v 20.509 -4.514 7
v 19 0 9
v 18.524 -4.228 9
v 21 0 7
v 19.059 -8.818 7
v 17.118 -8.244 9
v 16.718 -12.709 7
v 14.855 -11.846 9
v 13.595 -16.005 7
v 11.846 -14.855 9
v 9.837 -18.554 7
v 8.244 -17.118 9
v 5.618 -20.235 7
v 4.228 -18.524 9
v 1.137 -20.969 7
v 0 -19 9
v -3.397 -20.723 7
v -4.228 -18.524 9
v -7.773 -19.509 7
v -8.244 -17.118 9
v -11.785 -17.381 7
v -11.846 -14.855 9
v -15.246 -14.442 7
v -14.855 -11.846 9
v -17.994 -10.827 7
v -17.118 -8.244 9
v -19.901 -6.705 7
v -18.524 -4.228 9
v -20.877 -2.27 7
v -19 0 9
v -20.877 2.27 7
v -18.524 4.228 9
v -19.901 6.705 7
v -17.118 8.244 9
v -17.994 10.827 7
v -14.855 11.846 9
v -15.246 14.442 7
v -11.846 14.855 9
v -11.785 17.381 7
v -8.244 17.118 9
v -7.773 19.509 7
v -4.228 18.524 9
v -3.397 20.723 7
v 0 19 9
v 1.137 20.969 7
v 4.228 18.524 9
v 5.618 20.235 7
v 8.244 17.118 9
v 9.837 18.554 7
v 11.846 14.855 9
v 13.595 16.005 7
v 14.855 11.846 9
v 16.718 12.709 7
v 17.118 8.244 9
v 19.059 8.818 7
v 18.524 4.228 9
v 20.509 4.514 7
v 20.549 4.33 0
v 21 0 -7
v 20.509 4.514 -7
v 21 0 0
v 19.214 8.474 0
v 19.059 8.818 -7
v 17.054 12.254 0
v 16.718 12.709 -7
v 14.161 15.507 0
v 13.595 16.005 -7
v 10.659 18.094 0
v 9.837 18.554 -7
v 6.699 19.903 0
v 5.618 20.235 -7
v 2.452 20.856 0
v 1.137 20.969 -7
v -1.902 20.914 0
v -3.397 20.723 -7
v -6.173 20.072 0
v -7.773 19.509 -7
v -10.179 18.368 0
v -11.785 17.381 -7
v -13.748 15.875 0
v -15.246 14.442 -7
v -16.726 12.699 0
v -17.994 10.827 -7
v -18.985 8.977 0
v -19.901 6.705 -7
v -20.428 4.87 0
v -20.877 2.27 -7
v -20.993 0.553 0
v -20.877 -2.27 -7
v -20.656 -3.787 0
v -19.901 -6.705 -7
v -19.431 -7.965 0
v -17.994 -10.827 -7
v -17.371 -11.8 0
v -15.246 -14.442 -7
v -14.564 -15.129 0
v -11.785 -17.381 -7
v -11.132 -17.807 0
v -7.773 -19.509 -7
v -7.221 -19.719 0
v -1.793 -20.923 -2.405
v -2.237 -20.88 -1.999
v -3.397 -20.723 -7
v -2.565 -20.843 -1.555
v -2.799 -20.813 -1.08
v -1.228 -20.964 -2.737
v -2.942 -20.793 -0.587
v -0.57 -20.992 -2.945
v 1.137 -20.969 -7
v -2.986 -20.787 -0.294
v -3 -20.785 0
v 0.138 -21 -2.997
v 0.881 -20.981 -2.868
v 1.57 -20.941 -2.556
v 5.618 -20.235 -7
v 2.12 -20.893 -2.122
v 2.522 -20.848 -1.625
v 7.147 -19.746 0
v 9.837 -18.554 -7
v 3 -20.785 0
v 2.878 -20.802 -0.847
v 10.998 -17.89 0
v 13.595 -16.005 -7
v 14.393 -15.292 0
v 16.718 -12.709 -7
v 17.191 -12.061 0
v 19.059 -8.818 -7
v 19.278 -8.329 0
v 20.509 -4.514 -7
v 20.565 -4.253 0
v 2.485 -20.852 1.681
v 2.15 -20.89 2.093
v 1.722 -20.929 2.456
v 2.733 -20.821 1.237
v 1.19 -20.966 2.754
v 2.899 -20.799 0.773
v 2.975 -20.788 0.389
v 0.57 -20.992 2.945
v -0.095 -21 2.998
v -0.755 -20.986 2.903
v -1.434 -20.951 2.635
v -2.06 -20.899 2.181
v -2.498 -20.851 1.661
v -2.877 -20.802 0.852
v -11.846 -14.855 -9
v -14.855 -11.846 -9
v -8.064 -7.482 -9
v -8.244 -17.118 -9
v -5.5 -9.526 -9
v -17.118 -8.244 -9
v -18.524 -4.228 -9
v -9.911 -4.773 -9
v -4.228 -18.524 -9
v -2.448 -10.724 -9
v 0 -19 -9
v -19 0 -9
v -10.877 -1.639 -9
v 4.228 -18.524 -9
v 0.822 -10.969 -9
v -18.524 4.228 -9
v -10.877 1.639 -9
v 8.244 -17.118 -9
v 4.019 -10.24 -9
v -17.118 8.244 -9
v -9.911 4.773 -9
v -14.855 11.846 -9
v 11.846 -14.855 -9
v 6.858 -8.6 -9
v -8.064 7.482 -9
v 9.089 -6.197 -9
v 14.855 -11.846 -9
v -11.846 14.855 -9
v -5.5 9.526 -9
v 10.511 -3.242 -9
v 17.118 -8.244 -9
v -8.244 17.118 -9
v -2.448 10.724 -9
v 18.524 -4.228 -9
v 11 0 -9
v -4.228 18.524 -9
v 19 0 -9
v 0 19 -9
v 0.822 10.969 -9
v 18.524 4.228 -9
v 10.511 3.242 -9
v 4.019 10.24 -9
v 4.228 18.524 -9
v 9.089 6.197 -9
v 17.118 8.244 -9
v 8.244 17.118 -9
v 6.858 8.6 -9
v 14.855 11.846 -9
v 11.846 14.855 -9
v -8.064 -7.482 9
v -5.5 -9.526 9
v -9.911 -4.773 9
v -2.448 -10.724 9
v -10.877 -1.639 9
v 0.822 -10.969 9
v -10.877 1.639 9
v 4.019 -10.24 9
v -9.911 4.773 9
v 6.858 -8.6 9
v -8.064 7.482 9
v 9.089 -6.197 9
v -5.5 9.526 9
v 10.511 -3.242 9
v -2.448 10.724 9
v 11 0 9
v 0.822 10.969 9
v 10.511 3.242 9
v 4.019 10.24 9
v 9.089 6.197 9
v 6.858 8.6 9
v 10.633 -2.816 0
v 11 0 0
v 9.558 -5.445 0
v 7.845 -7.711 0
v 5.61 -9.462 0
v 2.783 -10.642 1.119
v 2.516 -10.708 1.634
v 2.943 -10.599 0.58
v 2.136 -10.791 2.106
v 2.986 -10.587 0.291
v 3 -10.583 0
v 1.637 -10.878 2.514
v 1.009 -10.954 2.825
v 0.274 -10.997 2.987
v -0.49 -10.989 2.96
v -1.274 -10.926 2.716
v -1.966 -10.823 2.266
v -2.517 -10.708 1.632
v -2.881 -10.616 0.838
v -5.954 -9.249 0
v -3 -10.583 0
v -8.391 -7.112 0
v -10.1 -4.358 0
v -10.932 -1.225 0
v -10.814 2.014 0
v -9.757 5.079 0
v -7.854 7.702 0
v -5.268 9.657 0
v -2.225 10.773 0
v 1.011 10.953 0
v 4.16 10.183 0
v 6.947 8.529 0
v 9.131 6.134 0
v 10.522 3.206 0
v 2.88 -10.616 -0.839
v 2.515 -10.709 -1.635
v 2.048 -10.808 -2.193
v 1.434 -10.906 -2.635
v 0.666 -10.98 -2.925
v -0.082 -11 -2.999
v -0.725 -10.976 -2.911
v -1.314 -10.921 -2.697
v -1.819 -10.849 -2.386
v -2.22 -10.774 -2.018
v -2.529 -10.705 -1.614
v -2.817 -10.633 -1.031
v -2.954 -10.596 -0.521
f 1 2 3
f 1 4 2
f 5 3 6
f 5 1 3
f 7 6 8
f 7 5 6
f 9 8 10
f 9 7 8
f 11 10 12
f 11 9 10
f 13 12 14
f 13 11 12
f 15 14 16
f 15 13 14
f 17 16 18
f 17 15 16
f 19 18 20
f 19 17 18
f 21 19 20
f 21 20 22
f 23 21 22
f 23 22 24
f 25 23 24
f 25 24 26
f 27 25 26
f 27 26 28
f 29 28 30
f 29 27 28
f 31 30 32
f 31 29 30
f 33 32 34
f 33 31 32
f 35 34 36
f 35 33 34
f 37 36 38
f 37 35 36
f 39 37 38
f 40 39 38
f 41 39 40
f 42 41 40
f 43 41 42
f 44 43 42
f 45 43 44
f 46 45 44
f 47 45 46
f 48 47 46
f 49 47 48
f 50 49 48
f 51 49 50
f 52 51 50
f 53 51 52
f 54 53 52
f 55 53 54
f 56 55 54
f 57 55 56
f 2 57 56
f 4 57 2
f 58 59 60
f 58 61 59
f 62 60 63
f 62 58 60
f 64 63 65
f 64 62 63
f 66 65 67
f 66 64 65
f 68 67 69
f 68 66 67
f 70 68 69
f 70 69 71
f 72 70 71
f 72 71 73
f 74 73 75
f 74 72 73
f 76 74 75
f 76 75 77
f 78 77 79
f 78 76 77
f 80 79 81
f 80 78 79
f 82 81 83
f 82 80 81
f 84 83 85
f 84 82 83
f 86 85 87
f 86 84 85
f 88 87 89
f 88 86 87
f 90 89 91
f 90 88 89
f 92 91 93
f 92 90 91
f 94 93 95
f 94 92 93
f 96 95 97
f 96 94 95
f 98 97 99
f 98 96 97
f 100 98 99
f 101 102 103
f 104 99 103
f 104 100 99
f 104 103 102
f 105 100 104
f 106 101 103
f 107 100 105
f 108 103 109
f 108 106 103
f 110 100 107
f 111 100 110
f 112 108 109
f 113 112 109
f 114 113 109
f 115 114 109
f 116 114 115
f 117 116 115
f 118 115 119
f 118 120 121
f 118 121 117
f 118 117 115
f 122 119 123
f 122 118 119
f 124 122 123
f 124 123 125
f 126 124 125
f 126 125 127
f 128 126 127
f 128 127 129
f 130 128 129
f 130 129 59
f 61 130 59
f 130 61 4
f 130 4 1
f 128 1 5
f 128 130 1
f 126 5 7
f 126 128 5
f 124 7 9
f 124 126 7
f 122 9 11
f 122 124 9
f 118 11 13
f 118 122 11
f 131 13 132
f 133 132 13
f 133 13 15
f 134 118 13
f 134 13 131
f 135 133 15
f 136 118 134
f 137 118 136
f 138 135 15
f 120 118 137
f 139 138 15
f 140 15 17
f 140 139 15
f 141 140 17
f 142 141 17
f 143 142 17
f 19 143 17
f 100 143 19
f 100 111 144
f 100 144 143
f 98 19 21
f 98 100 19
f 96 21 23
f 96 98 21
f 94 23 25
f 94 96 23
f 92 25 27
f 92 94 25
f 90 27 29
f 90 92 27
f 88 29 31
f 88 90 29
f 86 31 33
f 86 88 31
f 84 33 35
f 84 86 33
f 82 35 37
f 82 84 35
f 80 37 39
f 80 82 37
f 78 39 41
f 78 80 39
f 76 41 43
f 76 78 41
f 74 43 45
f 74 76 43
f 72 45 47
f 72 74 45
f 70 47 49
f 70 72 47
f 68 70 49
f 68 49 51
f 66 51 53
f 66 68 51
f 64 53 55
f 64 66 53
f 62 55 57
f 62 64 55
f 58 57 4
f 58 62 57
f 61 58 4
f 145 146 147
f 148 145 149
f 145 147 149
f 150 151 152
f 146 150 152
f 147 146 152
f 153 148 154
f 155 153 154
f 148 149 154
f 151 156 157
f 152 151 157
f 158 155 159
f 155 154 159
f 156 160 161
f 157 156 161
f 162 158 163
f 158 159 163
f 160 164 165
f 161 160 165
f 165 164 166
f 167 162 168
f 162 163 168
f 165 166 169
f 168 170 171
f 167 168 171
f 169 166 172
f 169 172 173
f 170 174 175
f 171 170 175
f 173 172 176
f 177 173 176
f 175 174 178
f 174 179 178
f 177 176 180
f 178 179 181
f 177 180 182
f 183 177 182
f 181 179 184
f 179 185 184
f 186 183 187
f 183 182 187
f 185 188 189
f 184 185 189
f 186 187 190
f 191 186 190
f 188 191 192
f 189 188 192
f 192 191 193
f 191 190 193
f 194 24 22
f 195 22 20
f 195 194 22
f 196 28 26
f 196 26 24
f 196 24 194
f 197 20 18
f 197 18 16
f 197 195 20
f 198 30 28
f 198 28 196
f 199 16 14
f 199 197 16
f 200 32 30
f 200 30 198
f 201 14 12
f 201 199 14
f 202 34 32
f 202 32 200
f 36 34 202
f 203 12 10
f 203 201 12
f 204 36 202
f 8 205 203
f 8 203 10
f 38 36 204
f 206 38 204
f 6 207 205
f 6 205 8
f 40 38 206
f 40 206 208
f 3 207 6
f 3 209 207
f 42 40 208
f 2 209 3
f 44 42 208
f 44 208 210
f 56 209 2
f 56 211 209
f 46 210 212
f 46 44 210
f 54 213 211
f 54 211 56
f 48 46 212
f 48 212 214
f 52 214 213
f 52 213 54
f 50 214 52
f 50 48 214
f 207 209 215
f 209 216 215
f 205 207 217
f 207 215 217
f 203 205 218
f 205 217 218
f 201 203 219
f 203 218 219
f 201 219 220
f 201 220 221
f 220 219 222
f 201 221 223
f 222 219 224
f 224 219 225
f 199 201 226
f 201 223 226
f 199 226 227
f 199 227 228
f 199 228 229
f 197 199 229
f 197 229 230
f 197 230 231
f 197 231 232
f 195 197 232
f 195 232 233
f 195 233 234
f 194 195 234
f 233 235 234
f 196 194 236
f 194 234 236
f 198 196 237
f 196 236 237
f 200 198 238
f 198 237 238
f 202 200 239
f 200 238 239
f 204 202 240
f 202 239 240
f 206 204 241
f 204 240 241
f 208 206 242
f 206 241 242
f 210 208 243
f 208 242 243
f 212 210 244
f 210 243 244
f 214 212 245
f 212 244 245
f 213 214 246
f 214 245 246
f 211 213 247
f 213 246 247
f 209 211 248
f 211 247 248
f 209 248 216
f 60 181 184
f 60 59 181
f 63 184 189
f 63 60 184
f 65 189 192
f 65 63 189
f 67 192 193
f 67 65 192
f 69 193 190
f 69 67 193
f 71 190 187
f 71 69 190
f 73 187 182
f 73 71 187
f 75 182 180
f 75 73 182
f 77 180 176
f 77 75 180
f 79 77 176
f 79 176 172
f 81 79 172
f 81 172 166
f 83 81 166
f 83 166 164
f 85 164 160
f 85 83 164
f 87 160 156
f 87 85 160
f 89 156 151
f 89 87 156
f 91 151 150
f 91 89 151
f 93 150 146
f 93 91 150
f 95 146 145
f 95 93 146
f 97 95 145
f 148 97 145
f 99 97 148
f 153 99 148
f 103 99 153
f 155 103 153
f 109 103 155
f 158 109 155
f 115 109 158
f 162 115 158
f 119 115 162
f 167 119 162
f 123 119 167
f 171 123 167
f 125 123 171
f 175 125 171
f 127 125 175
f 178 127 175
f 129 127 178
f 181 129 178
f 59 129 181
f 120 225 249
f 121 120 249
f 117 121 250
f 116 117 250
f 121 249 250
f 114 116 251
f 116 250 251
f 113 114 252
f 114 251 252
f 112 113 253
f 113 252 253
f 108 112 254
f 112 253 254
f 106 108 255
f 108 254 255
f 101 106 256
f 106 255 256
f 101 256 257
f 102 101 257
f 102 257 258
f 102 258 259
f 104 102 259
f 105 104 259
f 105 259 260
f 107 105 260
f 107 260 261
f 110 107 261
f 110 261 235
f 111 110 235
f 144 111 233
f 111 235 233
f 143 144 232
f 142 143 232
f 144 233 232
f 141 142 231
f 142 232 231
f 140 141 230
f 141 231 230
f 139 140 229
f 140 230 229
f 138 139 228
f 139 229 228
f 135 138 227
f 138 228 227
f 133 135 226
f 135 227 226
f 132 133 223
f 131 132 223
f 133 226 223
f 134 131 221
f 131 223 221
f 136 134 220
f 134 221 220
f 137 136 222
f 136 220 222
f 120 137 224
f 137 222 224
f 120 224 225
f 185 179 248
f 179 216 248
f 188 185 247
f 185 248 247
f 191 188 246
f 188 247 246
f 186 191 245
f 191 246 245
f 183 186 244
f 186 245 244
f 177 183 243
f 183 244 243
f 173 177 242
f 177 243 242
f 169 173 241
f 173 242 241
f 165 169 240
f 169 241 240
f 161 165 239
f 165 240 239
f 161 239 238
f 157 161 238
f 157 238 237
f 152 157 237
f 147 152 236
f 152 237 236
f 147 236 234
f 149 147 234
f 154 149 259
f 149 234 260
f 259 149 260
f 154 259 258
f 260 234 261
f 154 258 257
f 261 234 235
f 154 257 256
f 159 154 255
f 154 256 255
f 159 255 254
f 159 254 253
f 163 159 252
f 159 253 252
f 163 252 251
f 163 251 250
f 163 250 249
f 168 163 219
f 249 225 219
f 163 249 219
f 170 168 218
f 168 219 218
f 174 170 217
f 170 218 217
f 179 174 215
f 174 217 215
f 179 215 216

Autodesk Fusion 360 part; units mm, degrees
sketch "Sketch1" plane through (0, 0, 0) normal (0, 0, 1) x (1, 0, 0)
  circle A0 centre (0, 0) radius 11
  circle A1 centre (0, 0) radius 21
  dimension "d1" = 22
  dimension "d2" = 42
extrude "Extrude1" add sketch "Sketch1" along normal mid plane 18
chamfer "Chamfer1" distance 2 angle 45 2 edges at (-19.5789, -7.5939, 9) (-19.5789, 7.5939, -9)
sketch "Sketch2" plane through (0, 0, 0) normal (0, 1, 0) x (1, 0, 0)
  circle A0 centre (0, 0) radius 3
  dimension "d6" = 6
extrude "Extrude2" cut sketch "Sketch2" against normal blind 32
thread "Thread1" thread offset 0 thread length 10
thread "Thread2" thread offset 0 thread length 10
